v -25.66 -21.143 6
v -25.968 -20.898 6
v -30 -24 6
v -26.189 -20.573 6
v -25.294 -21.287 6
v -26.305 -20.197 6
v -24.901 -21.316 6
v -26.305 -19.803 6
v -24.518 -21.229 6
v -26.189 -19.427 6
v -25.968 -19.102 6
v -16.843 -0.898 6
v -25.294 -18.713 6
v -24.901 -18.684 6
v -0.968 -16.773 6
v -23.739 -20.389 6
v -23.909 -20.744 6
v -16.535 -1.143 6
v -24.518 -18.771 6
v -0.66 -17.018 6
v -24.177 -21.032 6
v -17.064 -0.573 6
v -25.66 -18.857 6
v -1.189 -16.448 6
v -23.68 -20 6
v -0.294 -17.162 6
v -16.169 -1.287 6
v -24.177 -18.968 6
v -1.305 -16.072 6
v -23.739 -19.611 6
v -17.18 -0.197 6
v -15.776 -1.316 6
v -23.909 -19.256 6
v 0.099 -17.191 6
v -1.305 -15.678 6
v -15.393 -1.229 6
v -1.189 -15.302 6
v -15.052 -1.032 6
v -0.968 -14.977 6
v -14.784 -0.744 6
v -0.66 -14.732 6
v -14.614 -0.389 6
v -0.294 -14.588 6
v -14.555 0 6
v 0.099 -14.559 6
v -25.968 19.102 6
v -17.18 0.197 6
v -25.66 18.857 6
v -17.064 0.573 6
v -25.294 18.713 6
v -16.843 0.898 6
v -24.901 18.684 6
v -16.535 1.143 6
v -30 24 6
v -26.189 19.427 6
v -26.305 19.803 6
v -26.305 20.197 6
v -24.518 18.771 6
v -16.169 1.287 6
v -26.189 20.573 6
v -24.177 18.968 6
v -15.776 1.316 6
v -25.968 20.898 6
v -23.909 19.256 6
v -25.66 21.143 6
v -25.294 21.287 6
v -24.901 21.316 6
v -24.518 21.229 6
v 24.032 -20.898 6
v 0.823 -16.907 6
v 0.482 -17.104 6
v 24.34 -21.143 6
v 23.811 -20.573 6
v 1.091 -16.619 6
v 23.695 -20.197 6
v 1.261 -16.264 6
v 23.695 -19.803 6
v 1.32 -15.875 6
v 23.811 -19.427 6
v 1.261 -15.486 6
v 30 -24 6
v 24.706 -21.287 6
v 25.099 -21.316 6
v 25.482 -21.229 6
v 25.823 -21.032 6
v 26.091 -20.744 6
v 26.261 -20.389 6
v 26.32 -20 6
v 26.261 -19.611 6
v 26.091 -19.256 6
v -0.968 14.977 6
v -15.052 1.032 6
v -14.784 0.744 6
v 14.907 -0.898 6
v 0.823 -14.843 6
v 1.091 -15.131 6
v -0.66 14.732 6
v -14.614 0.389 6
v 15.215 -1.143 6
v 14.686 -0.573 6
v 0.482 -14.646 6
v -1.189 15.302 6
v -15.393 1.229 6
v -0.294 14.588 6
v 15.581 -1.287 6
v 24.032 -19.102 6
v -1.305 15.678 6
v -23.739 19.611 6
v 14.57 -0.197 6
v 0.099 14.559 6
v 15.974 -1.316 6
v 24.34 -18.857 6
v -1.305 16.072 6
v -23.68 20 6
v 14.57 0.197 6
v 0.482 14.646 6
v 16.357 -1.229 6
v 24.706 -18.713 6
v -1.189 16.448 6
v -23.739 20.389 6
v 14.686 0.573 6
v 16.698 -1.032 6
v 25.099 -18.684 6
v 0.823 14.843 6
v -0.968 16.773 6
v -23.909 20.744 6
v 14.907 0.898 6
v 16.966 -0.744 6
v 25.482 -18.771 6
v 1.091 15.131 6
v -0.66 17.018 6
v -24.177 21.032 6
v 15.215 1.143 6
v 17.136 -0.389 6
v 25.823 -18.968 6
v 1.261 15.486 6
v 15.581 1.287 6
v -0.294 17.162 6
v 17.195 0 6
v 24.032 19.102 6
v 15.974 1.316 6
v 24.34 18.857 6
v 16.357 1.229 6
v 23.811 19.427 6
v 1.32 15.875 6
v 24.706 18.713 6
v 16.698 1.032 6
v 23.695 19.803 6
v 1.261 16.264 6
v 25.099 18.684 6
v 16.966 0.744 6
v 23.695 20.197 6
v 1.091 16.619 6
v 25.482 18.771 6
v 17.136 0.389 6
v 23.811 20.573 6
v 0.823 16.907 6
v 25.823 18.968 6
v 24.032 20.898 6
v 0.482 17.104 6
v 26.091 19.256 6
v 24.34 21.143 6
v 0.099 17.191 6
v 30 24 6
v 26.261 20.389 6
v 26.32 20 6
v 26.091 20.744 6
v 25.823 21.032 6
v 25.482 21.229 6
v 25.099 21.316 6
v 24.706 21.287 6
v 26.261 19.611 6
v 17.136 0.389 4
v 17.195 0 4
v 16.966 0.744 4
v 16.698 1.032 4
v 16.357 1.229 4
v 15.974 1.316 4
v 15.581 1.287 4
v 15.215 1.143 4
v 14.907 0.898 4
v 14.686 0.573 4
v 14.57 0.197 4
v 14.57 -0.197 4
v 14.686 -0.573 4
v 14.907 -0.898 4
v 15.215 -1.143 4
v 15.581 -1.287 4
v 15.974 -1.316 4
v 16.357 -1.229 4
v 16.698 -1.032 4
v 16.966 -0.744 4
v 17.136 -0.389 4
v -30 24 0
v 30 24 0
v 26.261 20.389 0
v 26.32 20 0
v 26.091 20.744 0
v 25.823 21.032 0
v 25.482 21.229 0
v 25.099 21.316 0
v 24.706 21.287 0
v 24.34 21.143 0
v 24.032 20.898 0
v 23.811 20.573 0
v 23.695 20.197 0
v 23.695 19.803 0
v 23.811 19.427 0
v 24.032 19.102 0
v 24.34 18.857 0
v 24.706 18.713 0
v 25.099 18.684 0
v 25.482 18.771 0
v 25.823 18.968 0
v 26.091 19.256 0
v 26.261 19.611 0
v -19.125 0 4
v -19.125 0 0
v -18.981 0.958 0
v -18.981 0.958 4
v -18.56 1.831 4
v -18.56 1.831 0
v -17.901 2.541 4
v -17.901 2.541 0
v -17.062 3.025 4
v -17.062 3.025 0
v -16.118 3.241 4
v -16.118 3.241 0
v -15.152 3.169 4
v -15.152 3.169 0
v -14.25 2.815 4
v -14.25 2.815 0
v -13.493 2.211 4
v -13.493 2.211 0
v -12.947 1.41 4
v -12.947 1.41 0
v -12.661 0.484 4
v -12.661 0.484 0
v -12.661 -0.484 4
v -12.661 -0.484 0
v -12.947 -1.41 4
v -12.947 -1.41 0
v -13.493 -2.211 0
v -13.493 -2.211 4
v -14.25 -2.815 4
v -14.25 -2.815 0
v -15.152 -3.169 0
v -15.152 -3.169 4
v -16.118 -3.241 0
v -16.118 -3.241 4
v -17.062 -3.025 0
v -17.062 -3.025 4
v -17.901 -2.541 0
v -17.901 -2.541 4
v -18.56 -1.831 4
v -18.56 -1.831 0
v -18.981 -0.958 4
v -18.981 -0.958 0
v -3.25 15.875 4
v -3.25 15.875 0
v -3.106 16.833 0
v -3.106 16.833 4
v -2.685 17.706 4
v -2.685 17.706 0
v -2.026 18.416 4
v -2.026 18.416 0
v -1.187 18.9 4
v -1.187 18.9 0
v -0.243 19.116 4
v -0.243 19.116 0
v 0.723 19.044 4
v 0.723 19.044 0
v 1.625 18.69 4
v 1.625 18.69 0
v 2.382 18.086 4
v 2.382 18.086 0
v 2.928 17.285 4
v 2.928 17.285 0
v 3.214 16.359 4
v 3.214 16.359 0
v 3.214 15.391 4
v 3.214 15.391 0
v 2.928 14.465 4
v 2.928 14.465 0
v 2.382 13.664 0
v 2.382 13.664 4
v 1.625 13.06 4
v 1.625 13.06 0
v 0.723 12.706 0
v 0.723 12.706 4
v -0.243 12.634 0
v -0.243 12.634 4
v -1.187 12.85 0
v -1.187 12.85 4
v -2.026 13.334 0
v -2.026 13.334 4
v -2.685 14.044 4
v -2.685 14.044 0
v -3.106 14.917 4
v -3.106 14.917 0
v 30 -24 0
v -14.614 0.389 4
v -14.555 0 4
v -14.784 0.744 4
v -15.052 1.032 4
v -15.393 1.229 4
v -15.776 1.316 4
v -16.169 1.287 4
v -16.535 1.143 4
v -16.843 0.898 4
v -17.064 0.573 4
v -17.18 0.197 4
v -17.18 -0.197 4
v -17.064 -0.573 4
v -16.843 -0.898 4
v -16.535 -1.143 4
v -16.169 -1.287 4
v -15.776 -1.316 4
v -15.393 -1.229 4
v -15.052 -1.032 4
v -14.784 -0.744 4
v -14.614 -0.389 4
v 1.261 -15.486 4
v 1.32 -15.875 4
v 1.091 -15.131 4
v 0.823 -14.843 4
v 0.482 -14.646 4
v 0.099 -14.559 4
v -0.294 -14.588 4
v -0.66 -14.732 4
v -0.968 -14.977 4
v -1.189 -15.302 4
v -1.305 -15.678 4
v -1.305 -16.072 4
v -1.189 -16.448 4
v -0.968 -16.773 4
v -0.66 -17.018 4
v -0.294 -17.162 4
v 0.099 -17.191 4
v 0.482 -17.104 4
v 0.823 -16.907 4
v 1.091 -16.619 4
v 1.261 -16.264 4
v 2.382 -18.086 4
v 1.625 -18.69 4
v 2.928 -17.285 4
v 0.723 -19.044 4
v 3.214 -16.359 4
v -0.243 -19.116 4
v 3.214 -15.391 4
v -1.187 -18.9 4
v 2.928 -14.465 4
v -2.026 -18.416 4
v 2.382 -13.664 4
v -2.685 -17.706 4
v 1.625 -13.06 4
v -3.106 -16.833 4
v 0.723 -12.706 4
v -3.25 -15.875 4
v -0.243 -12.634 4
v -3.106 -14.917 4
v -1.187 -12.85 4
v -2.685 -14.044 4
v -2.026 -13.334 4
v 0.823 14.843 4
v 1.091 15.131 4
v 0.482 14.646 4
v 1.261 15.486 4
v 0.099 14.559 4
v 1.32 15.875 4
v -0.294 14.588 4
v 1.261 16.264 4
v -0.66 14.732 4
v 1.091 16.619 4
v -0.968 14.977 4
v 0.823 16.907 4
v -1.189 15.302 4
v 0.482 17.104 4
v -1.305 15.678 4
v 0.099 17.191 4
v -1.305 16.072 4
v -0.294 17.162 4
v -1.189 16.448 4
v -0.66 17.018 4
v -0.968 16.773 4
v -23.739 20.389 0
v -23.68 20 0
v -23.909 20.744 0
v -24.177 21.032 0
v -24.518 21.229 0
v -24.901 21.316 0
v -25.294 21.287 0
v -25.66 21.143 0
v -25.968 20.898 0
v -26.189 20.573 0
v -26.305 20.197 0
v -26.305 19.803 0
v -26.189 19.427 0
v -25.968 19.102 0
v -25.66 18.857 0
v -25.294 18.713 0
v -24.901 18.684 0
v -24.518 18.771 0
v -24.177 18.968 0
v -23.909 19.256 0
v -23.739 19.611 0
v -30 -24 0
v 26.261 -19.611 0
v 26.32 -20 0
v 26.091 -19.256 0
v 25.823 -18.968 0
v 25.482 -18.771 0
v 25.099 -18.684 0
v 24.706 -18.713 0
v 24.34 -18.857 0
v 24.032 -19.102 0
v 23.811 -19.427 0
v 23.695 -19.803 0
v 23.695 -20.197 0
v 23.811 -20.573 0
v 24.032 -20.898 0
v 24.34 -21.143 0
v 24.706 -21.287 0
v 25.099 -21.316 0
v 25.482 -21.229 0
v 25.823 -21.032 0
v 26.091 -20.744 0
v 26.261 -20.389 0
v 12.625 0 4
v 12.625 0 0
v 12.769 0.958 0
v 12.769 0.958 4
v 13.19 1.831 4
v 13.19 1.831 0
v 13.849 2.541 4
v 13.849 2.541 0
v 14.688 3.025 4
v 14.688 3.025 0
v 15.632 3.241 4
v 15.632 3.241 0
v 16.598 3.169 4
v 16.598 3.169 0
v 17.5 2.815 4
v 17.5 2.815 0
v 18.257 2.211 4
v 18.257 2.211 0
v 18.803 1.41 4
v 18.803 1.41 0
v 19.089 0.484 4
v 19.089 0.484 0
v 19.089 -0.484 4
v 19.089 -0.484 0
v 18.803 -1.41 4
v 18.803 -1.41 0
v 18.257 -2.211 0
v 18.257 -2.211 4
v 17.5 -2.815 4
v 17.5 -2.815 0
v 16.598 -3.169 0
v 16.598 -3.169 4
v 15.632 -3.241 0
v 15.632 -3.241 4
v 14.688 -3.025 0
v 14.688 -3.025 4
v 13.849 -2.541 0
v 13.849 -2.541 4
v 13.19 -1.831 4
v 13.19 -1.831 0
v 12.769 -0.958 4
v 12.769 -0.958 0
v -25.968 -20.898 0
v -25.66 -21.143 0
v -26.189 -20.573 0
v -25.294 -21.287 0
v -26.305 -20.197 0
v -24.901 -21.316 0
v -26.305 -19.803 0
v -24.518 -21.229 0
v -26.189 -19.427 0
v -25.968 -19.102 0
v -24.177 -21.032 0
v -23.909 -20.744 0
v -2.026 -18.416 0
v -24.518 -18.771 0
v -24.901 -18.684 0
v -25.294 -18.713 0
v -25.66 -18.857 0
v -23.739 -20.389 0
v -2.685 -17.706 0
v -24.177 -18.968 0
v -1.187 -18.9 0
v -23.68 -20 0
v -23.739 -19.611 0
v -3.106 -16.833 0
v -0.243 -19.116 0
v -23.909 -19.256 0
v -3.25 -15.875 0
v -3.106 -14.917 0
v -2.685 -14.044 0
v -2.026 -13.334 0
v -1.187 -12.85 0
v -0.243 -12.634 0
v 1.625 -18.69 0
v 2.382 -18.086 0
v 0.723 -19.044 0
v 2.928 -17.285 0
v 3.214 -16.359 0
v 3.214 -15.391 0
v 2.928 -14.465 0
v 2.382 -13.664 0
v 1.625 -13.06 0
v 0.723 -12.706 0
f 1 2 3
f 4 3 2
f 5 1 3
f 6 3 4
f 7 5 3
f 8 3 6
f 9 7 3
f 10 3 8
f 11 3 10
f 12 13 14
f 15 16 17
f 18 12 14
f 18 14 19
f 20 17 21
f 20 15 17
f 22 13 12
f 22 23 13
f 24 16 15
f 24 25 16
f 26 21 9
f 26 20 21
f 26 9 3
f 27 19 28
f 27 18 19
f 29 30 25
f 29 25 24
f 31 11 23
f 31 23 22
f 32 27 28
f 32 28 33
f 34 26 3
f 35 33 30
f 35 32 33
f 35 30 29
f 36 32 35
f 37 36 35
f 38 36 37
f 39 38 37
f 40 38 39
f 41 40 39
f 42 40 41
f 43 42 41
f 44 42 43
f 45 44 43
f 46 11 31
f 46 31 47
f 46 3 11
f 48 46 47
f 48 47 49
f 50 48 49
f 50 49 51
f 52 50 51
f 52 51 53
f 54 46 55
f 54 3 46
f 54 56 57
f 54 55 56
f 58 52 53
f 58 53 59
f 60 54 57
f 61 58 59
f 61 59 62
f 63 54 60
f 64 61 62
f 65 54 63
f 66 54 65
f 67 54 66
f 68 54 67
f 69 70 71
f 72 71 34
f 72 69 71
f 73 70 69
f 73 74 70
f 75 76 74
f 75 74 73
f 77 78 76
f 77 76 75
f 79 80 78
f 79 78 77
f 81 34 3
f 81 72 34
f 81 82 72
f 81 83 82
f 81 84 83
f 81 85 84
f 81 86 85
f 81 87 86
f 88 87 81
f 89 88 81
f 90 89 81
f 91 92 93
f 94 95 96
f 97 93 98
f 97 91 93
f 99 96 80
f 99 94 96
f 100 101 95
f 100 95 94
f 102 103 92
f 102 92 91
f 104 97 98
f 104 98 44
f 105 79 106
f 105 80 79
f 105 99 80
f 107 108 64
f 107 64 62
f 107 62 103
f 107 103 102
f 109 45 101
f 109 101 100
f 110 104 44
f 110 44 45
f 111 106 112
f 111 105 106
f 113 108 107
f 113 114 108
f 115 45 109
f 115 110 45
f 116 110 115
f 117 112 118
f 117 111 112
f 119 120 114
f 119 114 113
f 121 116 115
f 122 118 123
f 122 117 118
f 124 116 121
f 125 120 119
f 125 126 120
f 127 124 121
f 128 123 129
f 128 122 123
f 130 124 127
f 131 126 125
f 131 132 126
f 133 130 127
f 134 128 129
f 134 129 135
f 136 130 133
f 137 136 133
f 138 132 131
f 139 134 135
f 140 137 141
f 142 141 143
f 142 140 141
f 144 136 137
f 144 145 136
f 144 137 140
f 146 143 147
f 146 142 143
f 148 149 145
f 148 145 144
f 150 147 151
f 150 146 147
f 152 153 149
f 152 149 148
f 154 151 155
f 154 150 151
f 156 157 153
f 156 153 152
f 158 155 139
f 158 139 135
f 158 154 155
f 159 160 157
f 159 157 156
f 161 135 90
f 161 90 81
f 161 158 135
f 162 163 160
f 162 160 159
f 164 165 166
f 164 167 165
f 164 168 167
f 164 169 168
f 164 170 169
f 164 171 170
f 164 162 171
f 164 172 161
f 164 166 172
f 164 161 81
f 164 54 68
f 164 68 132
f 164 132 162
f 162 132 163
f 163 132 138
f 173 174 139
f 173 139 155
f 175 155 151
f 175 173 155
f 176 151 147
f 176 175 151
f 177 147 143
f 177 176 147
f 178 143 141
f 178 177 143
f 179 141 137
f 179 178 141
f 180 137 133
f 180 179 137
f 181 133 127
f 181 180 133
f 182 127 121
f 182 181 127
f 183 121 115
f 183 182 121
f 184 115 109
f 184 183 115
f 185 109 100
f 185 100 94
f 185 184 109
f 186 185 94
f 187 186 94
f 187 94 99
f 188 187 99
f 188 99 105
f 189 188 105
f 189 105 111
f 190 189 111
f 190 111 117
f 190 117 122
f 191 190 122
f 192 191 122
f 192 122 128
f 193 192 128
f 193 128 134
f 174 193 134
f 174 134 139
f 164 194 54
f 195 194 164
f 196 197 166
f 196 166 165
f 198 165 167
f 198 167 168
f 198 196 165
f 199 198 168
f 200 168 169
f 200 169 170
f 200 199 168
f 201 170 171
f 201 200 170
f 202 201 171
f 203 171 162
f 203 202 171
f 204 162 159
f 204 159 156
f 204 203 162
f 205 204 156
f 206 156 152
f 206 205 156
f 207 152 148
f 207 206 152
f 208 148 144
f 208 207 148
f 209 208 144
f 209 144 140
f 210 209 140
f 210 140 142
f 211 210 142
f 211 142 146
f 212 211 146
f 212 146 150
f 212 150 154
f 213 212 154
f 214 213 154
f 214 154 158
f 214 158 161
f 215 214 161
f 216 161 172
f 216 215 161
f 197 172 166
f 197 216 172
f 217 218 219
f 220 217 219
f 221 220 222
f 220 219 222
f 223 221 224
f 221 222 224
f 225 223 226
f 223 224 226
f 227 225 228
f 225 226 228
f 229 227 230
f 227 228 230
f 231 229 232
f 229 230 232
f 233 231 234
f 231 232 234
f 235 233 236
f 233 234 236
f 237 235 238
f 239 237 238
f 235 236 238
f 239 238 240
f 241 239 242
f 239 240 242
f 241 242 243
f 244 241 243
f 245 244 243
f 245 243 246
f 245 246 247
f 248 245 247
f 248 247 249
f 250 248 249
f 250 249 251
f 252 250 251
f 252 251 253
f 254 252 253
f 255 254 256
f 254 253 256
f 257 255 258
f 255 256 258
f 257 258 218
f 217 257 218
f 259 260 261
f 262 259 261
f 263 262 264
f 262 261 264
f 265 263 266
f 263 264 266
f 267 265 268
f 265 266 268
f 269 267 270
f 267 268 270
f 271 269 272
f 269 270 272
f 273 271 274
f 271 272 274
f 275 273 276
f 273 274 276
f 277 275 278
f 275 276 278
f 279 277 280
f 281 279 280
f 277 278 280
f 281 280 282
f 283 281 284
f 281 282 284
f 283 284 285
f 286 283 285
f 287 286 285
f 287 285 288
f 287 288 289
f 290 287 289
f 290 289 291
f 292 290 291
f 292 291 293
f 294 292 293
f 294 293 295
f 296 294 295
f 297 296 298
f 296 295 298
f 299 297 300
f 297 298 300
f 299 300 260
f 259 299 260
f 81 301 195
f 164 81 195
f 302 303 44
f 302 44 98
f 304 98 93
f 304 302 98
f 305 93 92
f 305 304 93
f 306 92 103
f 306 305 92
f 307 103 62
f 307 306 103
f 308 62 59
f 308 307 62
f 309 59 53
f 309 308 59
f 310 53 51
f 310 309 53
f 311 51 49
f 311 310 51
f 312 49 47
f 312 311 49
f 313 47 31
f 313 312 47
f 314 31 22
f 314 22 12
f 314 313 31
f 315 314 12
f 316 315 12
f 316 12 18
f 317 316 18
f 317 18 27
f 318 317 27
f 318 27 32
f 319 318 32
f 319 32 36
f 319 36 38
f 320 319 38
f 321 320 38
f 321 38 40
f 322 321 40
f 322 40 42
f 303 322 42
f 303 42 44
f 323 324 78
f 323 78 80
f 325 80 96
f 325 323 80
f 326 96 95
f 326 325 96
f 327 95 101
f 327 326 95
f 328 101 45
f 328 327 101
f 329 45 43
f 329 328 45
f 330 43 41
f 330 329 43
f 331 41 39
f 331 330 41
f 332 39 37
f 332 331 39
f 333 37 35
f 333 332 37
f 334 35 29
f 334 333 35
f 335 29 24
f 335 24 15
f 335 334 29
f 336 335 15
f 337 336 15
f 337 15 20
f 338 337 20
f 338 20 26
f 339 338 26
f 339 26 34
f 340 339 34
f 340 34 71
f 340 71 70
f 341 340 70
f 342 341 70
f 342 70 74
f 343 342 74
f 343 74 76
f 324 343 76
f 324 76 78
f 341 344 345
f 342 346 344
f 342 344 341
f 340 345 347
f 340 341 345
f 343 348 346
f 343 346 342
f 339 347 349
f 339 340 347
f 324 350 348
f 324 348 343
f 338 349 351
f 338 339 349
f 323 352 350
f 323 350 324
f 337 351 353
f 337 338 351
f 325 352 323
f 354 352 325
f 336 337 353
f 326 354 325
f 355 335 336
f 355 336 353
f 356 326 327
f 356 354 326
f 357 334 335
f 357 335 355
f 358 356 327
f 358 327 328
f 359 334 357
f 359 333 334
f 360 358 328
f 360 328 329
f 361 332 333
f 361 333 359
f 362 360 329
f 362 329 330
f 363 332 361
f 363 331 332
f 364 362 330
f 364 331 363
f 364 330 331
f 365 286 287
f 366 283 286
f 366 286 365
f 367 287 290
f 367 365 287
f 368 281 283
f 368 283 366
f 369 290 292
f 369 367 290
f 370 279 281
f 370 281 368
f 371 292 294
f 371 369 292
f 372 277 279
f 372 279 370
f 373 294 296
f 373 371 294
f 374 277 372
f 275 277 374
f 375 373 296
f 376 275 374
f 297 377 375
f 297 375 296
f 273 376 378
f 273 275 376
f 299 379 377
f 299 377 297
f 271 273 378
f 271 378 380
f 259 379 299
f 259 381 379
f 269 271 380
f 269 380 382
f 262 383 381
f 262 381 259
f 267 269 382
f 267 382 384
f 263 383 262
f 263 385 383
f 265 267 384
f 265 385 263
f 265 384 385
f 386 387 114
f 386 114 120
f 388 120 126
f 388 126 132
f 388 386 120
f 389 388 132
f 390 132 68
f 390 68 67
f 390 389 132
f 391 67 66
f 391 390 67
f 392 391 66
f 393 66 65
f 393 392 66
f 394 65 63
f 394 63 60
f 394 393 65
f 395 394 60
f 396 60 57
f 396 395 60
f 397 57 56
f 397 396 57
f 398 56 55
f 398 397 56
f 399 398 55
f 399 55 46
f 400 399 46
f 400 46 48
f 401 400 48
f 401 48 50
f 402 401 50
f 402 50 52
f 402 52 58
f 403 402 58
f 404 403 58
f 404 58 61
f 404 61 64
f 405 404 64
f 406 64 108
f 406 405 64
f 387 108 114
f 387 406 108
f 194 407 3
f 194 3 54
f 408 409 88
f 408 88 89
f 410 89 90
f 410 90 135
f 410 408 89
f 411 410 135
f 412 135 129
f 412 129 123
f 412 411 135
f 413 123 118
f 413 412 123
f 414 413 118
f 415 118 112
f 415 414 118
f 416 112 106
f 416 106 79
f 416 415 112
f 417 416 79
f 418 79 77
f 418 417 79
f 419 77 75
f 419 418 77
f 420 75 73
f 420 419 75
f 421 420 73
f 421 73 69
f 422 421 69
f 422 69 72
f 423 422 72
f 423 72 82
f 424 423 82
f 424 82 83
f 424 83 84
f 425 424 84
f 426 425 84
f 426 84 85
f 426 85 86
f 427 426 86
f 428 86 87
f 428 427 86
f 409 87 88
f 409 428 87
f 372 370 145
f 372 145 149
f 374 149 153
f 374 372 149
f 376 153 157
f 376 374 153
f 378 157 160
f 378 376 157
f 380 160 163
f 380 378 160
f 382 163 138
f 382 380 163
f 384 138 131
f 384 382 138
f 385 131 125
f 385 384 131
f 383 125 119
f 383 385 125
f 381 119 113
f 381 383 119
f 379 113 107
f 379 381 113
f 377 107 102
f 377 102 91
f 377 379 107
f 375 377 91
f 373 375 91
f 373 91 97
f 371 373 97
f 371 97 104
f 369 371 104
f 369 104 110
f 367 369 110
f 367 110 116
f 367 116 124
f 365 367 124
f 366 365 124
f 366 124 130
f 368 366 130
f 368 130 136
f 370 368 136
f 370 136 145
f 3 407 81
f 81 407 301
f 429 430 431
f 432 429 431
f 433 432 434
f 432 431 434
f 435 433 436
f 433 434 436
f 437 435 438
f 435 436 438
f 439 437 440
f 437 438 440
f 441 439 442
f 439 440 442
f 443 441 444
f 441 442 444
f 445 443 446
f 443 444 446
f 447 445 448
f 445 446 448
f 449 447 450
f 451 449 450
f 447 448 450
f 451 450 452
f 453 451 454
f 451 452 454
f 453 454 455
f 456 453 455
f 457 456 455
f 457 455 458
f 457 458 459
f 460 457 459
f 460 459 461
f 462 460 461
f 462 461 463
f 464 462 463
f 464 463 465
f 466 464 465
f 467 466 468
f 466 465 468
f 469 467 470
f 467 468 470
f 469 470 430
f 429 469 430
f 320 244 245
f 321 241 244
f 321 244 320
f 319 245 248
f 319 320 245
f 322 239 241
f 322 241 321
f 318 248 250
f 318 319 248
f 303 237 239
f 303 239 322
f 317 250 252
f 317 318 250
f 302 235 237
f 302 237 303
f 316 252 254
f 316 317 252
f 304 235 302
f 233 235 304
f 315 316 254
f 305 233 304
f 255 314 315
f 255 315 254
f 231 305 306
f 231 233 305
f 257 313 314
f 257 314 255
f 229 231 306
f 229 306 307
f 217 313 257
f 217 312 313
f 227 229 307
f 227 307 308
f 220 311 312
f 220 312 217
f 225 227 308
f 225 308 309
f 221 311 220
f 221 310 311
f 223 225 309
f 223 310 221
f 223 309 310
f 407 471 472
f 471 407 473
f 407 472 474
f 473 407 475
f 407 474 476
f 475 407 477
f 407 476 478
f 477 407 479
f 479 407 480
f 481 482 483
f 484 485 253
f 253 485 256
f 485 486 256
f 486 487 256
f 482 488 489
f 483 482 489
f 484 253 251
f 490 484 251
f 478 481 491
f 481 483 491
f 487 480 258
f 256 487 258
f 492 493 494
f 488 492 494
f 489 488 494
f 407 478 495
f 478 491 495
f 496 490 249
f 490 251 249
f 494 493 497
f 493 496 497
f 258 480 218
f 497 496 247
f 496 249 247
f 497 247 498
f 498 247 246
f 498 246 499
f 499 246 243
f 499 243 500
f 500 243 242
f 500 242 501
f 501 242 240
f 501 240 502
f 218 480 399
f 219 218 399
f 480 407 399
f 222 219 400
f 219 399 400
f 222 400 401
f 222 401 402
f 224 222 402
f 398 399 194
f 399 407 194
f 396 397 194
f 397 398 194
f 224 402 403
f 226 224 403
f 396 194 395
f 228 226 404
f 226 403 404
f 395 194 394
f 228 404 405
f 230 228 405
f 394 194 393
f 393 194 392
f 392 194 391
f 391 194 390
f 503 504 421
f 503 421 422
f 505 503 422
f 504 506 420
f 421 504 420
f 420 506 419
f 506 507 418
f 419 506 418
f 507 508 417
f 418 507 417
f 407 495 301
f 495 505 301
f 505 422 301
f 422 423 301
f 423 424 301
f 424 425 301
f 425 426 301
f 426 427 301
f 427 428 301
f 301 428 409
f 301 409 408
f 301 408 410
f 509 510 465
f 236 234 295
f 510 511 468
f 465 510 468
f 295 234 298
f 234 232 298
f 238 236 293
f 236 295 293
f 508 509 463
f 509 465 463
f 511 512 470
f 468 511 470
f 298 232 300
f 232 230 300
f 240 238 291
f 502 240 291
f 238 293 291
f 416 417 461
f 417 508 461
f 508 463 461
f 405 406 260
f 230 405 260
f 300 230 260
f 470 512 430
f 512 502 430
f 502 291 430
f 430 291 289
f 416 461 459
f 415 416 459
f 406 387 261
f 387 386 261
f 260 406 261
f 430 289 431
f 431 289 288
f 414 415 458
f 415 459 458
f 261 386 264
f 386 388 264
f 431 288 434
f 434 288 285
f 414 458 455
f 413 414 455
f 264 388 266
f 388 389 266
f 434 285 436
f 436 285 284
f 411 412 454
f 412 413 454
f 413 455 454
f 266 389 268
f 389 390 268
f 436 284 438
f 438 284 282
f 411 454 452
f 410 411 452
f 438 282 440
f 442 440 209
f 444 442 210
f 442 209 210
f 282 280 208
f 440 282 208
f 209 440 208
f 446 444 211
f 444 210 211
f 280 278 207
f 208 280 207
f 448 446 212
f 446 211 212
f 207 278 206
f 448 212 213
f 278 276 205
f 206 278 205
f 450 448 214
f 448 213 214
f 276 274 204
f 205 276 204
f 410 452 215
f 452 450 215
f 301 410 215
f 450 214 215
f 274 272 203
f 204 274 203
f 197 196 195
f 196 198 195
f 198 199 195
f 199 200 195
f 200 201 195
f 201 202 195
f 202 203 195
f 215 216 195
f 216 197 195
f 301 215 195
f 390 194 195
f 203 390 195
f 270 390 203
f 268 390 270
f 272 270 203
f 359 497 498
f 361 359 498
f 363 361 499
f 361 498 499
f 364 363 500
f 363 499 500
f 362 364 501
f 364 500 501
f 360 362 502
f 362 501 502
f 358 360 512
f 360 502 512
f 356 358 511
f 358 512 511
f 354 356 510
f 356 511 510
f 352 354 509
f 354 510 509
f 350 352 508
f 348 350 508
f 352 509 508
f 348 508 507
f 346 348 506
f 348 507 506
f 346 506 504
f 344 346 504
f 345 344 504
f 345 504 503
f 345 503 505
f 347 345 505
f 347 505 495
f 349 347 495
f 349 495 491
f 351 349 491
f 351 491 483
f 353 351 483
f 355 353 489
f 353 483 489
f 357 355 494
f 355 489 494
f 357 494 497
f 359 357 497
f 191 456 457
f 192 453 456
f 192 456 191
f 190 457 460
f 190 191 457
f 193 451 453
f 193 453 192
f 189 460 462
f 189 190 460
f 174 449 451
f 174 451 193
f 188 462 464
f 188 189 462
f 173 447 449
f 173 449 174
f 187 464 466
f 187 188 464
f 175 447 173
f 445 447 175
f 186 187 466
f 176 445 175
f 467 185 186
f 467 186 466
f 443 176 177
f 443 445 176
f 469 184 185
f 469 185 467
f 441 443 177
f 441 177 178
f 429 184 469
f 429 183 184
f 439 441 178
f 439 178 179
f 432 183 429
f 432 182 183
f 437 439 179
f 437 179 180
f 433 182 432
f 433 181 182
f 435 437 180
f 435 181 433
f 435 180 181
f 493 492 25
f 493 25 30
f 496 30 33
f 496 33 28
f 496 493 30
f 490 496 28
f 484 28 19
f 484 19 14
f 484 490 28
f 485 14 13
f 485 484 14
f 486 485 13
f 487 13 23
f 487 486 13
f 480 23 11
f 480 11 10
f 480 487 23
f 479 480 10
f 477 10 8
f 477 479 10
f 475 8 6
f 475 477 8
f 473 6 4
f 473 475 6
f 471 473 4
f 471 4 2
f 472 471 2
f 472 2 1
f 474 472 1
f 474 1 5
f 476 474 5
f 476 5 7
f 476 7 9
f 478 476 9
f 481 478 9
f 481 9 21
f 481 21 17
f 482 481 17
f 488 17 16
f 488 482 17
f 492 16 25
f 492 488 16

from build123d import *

# Parameters (mm, degrees)
SKETCH1_W           = 60
SKETCH1_H           = 48
SKETCH1_R           = 1.32
BOSS_EXTRUDE1_DEPTH = 6
SKETCH2_R           = 3.25
CUT_EXTRUDE1_DEPTH  = 4


with BuildPart() as part:
    # Sketch1 → Boss-Extrude1 (new body)
    with BuildSketch(Plane.XY):
        Rectangle(SKETCH1_W, SKETCH1_H)
        with Locations((0, -15.875)):
            Circle(SKETCH1_R, mode=Mode.SUBTRACT)
        with Locations((-15.875, 0)):
            Circle(SKETCH1_R, mode=Mode.SUBTRACT)
        with Locations((0, 15.875)):
            Circle(SKETCH1_R, mode=Mode.SUBTRACT)
        with Locations((15.875, 0)):
            Circle(SKETCH1_R, mode=Mode.SUBTRACT)
        with Locations((-25, 20)):
            Circle(SKETCH1_R, mode=Mode.SUBTRACT)
        with Locations((25, 20)):
            Circle(SKETCH1_R, mode=Mode.SUBTRACT)
        with Locations((25, -20)):
            Circle(SKETCH1_R, mode=Mode.SUBTRACT)
        with Locations((-25, -20)):
            Circle(SKETCH1_R, mode=Mode.SUBTRACT)
    extrude(amount=BOSS_EXTRUDE1_DEPTH)

    # Sketch2 → Cut-Extrude1 (cut)
    with BuildSketch(Plane(origin=(0, 0, 0), x_dir=(-1, 0, 0), z_dir=(0, 0, -1))):
        with Locations((0, 15.875)):
            Circle(SKETCH2_R)
        with Locations((15.875, 0)):
            Circle(SKETCH2_R)
        with Locations((0, -15.875)):
            Circle(SKETCH2_R)
        with Locations((-15.875, 0)):
            Circle(SKETCH2_R)
    extrude(amount=-CUT_EXTRUDE1_DEPTH, mode=Mode.SUBTRACT)


solid = part.part
